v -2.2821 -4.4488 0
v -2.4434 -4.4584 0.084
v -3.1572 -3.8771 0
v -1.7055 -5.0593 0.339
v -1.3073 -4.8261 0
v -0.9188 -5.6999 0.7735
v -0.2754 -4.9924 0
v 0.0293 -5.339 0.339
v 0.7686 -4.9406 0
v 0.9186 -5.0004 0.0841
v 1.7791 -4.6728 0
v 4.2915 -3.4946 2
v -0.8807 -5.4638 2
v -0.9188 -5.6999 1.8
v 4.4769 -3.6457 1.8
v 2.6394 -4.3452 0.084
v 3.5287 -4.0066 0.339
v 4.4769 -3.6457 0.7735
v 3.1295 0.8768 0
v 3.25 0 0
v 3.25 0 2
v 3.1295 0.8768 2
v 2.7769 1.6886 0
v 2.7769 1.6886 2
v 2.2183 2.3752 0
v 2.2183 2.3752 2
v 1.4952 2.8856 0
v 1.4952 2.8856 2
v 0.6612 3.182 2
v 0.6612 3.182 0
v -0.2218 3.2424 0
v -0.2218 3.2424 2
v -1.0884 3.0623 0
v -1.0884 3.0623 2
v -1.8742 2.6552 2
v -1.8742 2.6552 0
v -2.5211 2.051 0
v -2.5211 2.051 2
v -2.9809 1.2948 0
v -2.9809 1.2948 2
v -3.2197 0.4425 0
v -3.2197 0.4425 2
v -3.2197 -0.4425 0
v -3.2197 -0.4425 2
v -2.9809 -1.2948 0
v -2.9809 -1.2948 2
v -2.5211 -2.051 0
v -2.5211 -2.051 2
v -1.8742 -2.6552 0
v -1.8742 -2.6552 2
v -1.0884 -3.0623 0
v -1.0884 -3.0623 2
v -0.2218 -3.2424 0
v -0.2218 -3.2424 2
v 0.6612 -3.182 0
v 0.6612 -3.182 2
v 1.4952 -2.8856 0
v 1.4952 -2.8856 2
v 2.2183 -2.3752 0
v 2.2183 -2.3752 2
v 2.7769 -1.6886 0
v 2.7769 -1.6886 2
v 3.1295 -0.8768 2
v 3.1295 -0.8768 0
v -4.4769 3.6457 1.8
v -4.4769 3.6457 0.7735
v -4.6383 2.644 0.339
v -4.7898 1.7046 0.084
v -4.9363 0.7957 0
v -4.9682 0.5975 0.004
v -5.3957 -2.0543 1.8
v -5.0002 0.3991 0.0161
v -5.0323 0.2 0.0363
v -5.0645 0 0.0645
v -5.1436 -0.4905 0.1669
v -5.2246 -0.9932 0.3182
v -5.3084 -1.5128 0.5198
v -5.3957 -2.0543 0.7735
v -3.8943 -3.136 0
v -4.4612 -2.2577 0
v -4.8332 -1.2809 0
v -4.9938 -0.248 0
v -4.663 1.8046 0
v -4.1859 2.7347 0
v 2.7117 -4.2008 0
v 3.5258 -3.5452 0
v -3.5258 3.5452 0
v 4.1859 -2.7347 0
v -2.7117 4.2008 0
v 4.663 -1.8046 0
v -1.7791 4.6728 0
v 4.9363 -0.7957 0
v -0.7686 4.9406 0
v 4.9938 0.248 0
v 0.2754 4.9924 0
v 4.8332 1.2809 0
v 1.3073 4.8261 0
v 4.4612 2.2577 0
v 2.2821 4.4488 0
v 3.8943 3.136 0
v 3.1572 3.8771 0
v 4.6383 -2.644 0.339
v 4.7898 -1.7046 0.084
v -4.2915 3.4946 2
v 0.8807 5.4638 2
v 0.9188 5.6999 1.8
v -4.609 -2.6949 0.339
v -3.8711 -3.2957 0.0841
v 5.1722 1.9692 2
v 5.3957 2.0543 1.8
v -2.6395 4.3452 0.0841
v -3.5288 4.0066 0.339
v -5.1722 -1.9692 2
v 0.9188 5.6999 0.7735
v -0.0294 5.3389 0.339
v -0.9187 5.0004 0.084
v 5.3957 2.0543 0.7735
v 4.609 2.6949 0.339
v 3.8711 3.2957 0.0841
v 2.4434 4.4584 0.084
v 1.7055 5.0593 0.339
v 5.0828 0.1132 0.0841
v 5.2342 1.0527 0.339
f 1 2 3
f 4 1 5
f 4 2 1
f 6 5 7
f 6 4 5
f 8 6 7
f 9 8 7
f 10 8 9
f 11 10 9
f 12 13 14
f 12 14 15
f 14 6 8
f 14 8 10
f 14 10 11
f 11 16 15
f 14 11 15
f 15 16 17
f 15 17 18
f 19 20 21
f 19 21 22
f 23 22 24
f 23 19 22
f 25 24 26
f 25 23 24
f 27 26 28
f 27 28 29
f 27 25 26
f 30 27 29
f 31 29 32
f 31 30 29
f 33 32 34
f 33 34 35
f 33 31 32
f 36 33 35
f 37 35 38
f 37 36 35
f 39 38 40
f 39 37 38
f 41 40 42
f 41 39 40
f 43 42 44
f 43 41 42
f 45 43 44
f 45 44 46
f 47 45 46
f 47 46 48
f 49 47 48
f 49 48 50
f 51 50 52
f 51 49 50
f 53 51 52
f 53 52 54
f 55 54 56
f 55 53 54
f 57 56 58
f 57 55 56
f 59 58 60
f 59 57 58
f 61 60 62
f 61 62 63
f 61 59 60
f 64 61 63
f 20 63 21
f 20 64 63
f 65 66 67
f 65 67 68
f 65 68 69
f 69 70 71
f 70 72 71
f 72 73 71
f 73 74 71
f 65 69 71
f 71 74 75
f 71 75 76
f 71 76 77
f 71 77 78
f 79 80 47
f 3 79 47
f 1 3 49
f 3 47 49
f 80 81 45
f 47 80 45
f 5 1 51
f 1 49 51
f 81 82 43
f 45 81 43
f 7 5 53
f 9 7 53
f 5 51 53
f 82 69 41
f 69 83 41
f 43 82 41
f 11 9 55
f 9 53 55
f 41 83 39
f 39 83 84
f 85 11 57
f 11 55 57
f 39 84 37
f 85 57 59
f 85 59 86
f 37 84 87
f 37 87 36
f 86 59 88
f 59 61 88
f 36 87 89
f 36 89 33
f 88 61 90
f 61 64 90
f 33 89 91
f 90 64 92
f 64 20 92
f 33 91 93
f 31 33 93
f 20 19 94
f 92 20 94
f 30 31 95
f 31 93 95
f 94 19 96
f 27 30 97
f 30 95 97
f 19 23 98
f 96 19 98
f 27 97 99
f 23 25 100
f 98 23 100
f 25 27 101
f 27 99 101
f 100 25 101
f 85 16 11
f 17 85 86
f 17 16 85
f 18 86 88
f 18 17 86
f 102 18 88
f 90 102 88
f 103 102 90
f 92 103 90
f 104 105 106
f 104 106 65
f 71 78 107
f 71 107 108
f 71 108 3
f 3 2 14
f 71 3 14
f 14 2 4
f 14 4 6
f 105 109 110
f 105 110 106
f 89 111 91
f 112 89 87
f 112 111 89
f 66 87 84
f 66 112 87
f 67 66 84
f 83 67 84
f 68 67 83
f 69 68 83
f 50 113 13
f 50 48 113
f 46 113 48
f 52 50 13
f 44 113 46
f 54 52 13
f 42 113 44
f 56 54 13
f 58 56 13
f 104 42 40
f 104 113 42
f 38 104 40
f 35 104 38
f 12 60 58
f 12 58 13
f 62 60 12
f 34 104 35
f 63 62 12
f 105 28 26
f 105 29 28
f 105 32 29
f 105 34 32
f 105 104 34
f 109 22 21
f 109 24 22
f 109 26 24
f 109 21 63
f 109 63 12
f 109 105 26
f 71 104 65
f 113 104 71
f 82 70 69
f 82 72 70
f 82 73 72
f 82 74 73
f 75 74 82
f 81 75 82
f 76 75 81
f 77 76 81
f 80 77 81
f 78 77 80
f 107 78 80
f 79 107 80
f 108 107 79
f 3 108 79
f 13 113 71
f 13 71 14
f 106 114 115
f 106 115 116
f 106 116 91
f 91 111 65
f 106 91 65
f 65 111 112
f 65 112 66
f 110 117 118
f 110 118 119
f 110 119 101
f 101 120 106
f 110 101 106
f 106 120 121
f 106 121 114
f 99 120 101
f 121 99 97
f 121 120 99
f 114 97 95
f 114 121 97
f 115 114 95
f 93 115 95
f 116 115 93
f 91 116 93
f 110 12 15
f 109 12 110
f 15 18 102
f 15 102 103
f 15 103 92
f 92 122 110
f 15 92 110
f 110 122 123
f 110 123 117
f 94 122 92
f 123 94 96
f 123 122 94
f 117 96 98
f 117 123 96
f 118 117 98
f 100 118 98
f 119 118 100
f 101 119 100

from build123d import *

# Parameters (mm, degrees)
CROQUIS1_R              = 3.25
SALIENTE_EXTRUIR1_DEPTH = 2
CROQUIS2_OUTSIDE_W      = 17.956
CROQUIS2_OUTSIDE_H      = 18.564
CROQUIS2_OUTSIDE_R      = 5
CORTAR_EXTRUIR1_DEPTH   = 1
CORTAR_EXTRUIR1_TAPER   = 45
CHAFL_N2_SIZE           = 0.2
CHAFL_N2_SIZE2          = 0.207106063
CHAFL_N2_PART_2_SIZE    = 0.2
CHAFL_N2_PART_2_SIZE2   = 0.207106063
CHAFL_N2_PART_3_SIZE    = 0.2
CHAFL_N2_PART_3_SIZE2   = 0.207106063
CHAFL_N2_PART_4_SIZE    = 0.2
CHAFL_N2_PART_4_SIZE2   = 0.207106063
CHAFL_N2_PART_5_SIZE    = 0.2
CHAFL_N2_PART_5_SIZE2   = 0.207106063
CHAFL_N2_PART_6_SIZE    = 0.2
CHAFL_N2_PART_6_SIZE2   = 0.207106063


with BuildPart() as part:
    # Croquis1 → Saliente-Extruir1 (new body)
    with BuildSketch(Plane.XY):
        Polygon((-5.395674006, -2.054272462), (-0.918784865, -5.699926991), (4.476889142, -3.645654529), (5.395674006, 2.054272462), (0.918784865, 5.699926991), (-4.476889142, 3.645654529), align=None)
        Circle(CROQUIS1_R, mode=Mode.SUBTRACT)
    extrude(amount=SALIENTE_EXTRUIR1_DEPTH)

    # Croquis2 outside → Cortar-Extruir1 (cut)
    with BuildSketch(Plane(origin=(0, 0, 0), x_dir=(-1, 0, 0), z_dir=(0, 0, -1))):
        Rectangle(CROQUIS2_OUTSIDE_W, CROQUIS2_OUTSIDE_H)
        Circle(CROQUIS2_OUTSIDE_R, mode=Mode.SUBTRACT)
    extrude(amount=-CORTAR_EXTRUIR1_DEPTH, taper=CORTAR_EXTRUIR1_TAPER, mode=Mode.SUBTRACT)

    # Chaflán2
    chafl_n2_edges = [part.edges().sort_by_distance(p)[0] for p in [
        (1.779052139, -4.67279076, 2),
    ]]
    chafl_n2_side = [part.faces().sort_by_distance(p)[0] for p in [
        (1.779052139, -4.67279076, 1.117030845),
    ]]
    chamfer(chafl_n2_edges, length=CHAFL_N2_SIZE, length2=CHAFL_N2_SIZE2, reference=chafl_n2_side[0])

    # Chaflán2 part 2
    chafl_n2_part_2_edges = [part.edges().sort_by_distance(p)[0] for p in [
        (4.936281574, -0.795691033, 2),
    ]]
    chafl_n2_part_2_side = [part.faces().sort_by_distance(p)[0] for p in [
        (4.936281574, -0.795691033, 1.117030845),
    ]]
    chamfer(chafl_n2_part_2_edges, length=CHAFL_N2_PART_2_SIZE, length2=CHAFL_N2_PART_2_SIZE2, reference=chafl_n2_part_2_side[0])

    # Chaflán2 part 3
    chafl_n2_part_3_edges = [part.edges().sort_by_distance(p)[0] for p in [
        (3.157229436, 3.877099727, 2),
    ]]
    chafl_n2_part_3_side = [part.faces().sort_by_distance(p)[0] for p in [
        (3.157229436, 3.877099727, 1.117030845),
    ]]
    chamfer(chafl_n2_part_3_edges, length=CHAFL_N2_PART_3_SIZE, length2=CHAFL_N2_PART_3_SIZE2, reference=chafl_n2_part_3_side[0])

    # Chaflán2 part 4
    chafl_n2_part_4_edges = [part.edges().sort_by_distance(p)[0] for p in [
        (-1.779052139, 4.67279076, 2),
    ]]
    chafl_n2_part_4_side = [part.faces().sort_by_distance(p)[0] for p in [
        (-1.779052139, 4.67279076, 1.117030845),
    ]]
    chamfer(chafl_n2_part_4_edges, length=CHAFL_N2_PART_4_SIZE, length2=CHAFL_N2_PART_4_SIZE2, reference=chafl_n2_part_4_side[0])

    # Chaflán2 part 5
    chafl_n2_part_5_edges = [part.edges().sort_by_distance(p)[0] for p in [
        (-4.936281574, 0.795691033, 2),
    ]]
    chafl_n2_part_5_side = [part.faces().sort_by_distance(p)[0] for p in [
        (-4.936281574, 0.795691033, 1.117030845),
    ]]
    chamfer(chafl_n2_part_5_edges, length=CHAFL_N2_PART_5_SIZE, length2=CHAFL_N2_PART_5_SIZE2, reference=chafl_n2_part_5_side[0])

    # Chaflán2 part 6
    chafl_n2_part_6_edges = [part.edges().sort_by_distance(p)[0] for p in [
        (-3.157229436, -3.877099727, 2),
    ]]
    chafl_n2_part_6_side = [part.faces().sort_by_distance(p)[0] for p in [
        (-3.157229436, -3.877099727, 1.117030845),
    ]]
    chamfer(chafl_n2_part_6_edges, length=CHAFL_N2_PART_6_SIZE, length2=CHAFL_N2_PART_6_SIZE2, reference=chafl_n2_part_6_side[0])


solid = part.part
